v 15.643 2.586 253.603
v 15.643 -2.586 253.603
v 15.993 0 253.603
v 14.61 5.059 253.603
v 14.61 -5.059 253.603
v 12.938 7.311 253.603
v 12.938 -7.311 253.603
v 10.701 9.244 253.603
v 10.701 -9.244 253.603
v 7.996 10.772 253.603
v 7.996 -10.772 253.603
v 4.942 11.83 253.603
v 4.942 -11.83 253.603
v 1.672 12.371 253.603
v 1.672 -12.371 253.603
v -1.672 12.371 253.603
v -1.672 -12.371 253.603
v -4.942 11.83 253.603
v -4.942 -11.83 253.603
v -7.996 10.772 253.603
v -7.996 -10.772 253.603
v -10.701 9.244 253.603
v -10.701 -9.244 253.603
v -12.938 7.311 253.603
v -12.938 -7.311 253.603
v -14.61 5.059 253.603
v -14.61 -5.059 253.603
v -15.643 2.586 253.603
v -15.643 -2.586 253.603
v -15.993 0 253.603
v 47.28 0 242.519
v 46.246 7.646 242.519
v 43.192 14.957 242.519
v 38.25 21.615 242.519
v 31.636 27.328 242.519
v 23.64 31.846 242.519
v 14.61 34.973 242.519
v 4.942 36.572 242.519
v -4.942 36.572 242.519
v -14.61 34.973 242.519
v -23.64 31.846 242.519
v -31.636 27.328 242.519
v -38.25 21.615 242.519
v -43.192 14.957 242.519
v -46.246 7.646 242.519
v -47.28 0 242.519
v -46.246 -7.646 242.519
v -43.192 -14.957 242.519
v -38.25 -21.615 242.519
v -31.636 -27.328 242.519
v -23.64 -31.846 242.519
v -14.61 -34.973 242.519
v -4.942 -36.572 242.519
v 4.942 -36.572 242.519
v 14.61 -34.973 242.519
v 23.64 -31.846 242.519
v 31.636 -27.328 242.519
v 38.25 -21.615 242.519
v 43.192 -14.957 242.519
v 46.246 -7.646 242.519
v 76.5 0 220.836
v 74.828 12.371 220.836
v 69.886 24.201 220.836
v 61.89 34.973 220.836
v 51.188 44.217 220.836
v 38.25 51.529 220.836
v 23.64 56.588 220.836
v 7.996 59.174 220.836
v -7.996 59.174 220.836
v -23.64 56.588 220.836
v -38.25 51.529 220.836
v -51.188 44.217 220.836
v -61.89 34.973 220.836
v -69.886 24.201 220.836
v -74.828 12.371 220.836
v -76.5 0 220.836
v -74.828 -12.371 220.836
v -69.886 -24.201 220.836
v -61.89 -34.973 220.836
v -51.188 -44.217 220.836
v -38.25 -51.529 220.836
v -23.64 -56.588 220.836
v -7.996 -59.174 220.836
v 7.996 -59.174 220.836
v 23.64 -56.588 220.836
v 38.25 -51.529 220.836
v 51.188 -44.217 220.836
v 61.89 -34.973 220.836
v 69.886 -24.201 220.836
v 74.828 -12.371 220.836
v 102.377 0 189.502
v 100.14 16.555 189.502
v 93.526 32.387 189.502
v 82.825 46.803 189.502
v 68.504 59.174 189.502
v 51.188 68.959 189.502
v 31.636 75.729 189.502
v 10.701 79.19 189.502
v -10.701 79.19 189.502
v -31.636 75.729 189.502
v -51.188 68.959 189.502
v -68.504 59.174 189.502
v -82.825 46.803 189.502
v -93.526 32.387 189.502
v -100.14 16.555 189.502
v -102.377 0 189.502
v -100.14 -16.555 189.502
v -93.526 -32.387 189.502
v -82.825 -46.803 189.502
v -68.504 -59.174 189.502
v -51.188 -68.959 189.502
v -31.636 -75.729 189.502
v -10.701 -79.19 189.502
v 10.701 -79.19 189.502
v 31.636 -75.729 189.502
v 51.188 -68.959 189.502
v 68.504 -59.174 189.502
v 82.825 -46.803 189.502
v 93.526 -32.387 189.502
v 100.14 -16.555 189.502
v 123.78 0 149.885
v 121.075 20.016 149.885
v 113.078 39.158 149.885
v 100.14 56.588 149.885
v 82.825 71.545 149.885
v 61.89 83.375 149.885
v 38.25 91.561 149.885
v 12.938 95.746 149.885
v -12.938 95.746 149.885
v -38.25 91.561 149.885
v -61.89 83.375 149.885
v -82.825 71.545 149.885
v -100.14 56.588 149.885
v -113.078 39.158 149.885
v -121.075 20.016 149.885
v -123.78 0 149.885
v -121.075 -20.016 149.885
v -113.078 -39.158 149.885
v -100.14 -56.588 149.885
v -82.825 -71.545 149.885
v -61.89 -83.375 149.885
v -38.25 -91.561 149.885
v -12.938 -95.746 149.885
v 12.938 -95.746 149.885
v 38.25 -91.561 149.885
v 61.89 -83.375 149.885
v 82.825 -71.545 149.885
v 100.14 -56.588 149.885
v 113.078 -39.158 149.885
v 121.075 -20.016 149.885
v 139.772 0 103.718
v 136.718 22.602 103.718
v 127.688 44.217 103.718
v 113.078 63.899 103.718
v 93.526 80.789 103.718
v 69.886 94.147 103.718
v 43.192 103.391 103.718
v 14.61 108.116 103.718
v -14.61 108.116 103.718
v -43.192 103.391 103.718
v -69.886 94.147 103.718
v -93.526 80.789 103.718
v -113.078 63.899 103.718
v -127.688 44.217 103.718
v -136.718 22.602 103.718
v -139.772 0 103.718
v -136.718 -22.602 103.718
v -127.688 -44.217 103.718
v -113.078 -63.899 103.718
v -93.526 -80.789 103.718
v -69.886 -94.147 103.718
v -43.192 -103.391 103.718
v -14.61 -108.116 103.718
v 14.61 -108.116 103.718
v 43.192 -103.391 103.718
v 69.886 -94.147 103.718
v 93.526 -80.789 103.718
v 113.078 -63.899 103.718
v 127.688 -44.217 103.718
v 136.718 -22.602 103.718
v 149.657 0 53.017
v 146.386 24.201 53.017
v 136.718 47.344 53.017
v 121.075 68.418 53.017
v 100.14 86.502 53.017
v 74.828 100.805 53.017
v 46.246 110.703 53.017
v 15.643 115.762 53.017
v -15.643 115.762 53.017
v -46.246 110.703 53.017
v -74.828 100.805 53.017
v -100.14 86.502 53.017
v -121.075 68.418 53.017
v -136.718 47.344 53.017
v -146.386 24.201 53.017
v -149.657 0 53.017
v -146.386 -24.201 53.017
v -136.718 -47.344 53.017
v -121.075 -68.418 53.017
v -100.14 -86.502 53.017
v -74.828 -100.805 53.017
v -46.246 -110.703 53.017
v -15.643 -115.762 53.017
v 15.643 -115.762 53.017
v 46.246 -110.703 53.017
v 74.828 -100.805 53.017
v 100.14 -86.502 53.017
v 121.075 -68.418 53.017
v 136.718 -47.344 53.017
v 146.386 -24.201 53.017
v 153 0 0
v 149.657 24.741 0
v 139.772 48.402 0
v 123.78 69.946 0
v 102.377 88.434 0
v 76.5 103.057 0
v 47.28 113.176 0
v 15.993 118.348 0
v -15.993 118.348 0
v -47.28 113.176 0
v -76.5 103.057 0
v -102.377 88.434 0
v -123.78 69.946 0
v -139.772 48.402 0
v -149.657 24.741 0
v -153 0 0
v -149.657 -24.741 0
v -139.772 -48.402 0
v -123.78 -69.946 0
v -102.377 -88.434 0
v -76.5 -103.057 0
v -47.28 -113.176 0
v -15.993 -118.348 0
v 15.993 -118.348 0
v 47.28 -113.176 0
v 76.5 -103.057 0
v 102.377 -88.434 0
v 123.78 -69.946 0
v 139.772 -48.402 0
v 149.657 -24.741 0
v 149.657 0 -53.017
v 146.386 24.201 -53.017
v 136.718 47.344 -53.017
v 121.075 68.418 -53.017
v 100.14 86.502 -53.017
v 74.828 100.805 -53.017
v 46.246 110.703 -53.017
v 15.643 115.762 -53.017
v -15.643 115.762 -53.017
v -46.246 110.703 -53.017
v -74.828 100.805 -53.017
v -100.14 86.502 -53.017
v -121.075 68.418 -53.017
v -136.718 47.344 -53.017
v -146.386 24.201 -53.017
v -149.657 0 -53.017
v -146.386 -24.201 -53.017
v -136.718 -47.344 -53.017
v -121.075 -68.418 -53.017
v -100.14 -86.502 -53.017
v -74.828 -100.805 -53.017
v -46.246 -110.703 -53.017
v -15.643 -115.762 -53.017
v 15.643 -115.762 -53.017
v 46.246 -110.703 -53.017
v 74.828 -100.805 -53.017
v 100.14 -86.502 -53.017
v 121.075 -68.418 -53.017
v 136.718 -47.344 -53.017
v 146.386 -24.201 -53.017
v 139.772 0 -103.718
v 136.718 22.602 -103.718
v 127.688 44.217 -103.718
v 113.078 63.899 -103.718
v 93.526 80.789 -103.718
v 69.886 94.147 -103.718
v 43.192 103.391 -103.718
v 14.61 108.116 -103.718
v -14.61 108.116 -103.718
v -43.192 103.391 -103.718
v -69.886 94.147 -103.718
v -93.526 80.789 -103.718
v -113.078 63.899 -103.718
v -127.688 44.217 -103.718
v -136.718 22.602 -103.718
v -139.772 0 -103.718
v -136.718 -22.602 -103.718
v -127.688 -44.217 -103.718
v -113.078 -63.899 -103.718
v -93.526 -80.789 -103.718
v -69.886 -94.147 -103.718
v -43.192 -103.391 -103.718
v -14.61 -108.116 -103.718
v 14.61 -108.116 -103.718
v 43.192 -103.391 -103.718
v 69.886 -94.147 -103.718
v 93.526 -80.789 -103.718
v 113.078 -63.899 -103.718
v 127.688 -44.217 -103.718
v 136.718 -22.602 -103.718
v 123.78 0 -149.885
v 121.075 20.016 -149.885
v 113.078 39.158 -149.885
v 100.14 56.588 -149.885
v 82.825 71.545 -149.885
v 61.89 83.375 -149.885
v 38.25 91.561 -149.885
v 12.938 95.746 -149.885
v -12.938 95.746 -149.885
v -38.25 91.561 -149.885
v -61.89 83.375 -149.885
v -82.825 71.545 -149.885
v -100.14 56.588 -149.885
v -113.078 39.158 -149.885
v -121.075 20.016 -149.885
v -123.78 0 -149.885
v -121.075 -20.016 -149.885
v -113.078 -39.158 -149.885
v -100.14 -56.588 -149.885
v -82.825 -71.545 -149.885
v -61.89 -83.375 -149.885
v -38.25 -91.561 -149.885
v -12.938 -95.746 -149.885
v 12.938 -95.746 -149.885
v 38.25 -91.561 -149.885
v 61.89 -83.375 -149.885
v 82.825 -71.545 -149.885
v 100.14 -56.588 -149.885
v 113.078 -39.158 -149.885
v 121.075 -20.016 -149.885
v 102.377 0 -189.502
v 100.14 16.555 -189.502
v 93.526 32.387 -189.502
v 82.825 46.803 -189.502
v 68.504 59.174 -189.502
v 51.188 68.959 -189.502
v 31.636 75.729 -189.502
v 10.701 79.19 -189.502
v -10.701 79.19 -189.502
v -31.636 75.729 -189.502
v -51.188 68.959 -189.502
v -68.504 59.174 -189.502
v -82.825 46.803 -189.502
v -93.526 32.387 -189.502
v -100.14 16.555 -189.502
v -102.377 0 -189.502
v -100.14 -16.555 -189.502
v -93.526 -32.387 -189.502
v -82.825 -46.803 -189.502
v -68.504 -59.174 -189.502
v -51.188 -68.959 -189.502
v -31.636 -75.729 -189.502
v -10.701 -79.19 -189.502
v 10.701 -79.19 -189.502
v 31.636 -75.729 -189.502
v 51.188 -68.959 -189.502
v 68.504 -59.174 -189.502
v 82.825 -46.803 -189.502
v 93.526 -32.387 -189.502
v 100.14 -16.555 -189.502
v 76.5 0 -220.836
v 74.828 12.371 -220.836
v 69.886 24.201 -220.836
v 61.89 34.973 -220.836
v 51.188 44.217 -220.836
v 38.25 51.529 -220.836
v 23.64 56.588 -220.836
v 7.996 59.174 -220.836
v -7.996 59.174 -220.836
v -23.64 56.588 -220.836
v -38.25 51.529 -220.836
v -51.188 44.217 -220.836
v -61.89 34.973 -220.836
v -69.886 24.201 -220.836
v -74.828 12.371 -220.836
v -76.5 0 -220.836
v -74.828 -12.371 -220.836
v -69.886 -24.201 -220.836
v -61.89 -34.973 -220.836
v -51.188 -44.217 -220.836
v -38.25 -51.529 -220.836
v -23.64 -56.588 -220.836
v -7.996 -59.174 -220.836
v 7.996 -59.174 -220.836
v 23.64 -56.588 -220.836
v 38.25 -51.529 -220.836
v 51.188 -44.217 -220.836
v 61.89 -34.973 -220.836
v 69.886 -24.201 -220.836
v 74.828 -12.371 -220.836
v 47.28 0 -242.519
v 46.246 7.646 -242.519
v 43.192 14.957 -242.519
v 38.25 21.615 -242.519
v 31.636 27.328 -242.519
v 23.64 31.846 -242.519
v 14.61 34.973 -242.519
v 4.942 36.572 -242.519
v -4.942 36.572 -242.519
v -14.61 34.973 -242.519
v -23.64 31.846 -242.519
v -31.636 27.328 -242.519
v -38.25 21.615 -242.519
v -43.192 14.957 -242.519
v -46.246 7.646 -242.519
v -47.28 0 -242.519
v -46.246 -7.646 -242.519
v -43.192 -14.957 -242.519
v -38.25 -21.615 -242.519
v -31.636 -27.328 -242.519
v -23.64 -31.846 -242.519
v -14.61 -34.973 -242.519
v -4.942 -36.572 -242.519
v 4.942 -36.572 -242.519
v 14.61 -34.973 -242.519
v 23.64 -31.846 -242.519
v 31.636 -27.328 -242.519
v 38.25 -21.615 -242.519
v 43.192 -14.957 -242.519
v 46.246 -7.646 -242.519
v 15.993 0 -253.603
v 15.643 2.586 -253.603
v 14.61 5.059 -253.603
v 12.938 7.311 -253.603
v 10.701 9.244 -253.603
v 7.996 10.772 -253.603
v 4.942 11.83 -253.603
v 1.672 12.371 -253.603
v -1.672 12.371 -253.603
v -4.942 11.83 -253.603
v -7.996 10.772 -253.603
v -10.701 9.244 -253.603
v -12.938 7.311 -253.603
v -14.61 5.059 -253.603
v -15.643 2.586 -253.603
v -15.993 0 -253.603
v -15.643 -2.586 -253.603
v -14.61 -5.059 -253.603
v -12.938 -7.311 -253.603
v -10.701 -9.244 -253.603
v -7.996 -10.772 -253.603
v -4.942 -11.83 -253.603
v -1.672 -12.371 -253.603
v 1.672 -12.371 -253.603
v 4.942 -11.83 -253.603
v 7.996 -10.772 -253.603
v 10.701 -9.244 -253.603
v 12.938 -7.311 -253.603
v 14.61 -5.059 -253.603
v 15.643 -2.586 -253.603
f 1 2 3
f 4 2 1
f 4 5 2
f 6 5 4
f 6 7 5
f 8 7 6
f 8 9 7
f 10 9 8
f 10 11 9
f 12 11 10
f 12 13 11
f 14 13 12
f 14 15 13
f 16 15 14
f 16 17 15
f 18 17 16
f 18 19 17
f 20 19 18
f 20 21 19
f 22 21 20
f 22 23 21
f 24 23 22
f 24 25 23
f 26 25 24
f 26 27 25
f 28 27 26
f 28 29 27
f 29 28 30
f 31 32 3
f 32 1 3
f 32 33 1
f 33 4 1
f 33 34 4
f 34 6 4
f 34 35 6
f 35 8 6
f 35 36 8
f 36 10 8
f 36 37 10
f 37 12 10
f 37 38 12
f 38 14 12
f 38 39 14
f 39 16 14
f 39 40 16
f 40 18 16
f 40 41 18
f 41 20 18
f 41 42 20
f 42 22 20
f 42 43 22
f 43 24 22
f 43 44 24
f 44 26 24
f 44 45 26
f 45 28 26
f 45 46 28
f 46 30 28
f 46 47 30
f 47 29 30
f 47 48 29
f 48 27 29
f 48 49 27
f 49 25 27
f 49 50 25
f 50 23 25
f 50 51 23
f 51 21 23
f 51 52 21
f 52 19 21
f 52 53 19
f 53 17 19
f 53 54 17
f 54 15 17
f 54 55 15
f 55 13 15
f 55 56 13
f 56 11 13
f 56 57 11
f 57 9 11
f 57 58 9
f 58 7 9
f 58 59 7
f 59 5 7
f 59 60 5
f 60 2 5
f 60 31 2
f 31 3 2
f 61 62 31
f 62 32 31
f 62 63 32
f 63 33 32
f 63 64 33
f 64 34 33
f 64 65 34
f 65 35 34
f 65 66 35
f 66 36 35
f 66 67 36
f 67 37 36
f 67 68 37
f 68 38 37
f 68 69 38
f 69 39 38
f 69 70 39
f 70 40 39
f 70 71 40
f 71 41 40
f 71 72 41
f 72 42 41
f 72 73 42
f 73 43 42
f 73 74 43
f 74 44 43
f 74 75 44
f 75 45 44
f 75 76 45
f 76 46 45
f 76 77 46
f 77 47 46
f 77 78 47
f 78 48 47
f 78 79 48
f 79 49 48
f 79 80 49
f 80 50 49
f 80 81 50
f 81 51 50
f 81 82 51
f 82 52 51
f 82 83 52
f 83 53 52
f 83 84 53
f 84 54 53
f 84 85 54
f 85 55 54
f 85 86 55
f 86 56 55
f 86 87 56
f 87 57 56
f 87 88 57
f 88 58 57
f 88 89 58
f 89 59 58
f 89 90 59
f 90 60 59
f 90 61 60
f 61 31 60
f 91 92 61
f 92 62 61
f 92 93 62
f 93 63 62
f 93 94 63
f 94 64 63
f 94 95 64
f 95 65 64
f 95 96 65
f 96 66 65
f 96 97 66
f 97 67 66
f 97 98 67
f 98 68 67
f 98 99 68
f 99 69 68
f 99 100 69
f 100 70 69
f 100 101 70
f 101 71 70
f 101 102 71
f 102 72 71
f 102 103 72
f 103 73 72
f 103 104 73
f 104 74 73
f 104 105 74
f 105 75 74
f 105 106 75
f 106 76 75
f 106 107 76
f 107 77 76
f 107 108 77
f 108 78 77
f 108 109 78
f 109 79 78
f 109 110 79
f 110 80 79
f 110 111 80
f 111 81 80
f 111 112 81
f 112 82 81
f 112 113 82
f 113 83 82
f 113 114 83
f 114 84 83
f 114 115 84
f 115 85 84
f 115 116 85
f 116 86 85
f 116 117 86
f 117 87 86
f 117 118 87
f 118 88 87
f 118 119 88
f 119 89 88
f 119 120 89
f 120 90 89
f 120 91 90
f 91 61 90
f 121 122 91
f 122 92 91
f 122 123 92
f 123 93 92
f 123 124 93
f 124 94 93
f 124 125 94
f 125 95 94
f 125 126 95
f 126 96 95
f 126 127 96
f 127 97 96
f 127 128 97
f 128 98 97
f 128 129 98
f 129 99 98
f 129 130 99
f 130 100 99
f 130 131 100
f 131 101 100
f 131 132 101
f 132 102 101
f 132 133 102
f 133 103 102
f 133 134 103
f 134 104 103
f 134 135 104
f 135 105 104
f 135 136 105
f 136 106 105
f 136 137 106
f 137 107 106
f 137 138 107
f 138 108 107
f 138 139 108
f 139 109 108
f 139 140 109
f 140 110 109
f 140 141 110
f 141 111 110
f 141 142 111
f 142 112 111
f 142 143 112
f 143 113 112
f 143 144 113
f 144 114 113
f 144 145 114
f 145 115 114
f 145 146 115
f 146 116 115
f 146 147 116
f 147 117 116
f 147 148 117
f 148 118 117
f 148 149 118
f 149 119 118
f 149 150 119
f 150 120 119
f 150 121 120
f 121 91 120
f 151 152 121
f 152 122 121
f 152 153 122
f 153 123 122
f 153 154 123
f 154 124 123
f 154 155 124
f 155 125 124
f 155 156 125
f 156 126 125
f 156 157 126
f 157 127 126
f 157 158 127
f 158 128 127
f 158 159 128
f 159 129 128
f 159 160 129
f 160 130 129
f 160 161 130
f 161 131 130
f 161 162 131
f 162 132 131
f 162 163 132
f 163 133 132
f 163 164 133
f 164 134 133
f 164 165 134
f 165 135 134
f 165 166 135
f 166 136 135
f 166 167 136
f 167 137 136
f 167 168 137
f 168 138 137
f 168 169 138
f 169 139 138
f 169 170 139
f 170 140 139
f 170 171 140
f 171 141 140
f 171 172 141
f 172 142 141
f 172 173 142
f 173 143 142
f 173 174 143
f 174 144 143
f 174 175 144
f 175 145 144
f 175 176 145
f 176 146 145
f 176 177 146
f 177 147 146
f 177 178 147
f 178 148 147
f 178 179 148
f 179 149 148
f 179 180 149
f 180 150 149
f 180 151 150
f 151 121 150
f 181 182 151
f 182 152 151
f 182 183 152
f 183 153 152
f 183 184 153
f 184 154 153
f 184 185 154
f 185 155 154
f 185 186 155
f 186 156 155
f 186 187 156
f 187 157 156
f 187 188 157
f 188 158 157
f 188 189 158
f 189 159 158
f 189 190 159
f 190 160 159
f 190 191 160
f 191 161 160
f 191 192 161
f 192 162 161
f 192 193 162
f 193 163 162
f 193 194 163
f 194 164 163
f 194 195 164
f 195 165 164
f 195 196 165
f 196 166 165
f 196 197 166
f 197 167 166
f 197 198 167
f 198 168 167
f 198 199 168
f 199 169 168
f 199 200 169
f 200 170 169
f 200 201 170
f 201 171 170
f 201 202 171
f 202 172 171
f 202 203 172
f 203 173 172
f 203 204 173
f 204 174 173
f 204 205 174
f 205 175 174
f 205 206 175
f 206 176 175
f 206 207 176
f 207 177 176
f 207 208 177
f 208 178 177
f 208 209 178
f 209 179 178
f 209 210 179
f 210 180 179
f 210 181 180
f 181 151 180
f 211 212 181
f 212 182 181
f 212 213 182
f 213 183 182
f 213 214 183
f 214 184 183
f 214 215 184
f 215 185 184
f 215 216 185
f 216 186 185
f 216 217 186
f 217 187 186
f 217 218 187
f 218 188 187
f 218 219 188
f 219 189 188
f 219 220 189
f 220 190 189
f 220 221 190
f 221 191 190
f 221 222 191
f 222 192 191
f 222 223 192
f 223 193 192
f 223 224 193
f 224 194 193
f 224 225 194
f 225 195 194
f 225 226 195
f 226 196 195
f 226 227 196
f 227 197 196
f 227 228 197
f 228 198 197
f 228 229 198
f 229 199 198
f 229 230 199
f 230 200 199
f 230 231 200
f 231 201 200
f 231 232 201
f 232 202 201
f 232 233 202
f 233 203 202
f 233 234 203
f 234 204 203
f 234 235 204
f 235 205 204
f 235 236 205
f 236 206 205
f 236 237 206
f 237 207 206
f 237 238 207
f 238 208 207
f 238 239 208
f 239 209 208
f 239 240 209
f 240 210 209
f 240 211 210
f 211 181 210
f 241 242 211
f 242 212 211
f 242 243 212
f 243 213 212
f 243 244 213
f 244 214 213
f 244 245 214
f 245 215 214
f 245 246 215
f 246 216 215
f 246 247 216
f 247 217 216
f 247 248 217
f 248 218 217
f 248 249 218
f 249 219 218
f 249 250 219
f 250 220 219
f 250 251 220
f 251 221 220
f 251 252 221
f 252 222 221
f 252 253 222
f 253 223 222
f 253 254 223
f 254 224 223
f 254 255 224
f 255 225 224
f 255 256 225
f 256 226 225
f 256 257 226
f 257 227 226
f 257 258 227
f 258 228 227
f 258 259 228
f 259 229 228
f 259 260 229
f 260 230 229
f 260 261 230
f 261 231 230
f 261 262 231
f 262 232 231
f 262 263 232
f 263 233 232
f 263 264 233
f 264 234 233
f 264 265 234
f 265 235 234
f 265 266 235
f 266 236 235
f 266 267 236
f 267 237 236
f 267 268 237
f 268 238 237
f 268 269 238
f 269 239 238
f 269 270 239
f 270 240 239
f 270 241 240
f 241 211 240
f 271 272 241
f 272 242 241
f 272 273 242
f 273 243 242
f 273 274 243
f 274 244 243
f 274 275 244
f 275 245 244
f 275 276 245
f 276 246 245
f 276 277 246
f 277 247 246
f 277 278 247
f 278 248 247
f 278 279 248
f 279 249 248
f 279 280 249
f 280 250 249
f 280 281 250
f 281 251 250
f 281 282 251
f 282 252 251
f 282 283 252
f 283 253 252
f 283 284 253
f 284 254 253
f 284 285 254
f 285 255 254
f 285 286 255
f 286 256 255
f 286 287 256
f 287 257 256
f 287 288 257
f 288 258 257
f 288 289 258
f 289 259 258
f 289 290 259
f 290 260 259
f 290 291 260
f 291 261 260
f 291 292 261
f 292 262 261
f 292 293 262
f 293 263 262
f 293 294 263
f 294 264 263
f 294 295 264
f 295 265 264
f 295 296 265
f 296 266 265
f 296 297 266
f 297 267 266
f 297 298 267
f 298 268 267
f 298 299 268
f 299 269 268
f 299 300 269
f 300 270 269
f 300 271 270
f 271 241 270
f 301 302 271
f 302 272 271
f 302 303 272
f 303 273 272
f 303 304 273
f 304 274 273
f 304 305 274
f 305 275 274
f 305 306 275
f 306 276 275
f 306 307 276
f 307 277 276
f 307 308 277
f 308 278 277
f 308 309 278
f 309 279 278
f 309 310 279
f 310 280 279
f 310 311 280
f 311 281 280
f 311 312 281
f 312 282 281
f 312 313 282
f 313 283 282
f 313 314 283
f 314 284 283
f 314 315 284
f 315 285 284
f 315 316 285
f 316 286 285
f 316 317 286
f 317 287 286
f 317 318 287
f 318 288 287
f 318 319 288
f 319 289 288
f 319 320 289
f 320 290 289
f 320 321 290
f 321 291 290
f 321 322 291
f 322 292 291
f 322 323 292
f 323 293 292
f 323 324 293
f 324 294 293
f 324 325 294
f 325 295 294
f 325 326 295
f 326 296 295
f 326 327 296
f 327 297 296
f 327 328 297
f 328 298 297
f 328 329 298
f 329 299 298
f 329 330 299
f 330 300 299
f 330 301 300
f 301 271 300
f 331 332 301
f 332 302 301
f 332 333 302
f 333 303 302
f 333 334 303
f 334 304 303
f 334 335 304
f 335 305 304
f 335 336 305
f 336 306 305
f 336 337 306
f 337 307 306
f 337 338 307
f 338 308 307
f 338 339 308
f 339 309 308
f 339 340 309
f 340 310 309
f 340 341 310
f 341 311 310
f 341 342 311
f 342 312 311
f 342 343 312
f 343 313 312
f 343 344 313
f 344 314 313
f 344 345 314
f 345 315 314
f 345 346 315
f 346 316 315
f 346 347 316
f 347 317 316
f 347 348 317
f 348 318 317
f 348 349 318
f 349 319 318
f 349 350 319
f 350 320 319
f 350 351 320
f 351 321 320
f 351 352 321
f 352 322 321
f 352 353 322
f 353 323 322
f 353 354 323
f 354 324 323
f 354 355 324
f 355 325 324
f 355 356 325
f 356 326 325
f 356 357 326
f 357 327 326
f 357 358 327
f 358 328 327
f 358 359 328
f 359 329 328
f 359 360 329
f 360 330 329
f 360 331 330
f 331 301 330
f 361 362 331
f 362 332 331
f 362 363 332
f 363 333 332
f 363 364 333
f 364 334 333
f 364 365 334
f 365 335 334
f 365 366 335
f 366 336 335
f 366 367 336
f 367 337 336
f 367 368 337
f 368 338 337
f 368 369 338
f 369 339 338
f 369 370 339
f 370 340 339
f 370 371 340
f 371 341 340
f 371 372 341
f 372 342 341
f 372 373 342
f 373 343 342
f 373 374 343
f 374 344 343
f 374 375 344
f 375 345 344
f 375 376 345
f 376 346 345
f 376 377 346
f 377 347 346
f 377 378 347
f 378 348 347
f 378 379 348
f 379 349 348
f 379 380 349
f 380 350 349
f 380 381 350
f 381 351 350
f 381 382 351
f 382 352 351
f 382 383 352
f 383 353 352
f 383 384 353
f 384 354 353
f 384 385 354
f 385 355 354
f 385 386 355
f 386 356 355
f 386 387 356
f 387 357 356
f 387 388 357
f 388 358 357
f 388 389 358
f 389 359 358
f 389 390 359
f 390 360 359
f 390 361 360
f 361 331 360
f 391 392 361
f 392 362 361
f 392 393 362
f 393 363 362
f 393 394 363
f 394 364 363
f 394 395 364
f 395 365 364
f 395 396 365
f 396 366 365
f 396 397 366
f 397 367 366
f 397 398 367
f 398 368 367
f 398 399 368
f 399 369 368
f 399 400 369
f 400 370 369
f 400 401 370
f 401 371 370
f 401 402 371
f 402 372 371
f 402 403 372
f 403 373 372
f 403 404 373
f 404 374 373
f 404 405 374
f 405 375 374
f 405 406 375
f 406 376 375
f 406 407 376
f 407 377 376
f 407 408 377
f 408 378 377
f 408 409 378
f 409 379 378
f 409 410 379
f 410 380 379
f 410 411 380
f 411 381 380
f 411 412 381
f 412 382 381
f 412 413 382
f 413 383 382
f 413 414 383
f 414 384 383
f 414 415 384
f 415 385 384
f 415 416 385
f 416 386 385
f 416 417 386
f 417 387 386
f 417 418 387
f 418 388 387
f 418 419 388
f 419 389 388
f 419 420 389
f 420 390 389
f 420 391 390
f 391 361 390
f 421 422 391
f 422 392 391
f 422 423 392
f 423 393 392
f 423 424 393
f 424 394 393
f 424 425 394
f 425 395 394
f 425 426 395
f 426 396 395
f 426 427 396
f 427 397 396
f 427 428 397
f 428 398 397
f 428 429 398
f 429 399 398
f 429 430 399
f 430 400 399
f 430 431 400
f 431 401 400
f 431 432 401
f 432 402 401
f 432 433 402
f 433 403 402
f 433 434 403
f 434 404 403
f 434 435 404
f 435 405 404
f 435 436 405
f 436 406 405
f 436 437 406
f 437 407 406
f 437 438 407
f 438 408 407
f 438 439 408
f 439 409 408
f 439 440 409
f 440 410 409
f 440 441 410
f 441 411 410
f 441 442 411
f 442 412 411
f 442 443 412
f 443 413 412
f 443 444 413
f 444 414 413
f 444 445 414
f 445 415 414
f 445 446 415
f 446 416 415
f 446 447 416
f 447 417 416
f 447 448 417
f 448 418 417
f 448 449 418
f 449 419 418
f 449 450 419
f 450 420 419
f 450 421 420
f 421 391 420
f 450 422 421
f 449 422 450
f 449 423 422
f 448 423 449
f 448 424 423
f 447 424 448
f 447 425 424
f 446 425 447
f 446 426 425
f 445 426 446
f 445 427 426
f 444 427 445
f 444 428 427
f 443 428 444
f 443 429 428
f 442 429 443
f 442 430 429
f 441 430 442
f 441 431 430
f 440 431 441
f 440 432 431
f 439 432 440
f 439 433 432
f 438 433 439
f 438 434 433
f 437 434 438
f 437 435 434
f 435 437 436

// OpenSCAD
// Generated by SolidPython 1.0.1 on 2020-07-29 00:46:48


scale(v = [9, 7, 15]) {
	sphere(r = 17);
}
/***********************************************
*********      SolidPython code:      **********
************************************************
 
# import packages: SolidPython
from solid import *
from solid.utils import *
from itertools import chain, combinations, permutations


class Resize:

    def __init__(self, scad_file):
        self.scad_file = scad_file
        #self.scad_file = import_scad(scad_file)
        # cone/cylinder param:
        self.r1 = 0
        self.r2 = 0
        self.h = 0
        # rectangular prism param:
        self.w = 0
        self.l = 0
        # ellipse param:
        self.r = 0

    # import OpenScad code (file name corresponds to shape)


    # classify shape + parameters
    def assign(self, param1, param2, param3):
        if self.scad_file == 'cone.scad':
            self.r1 = param1
            self.r2 = param2
            self.h = param3
        elif self.scad_file == 'cylinder.scad':
            self.r1 = param1
            self.r2 = param2
            self.h = param3
        elif self.scad_file == 'rectangularPrism.scad':
            self.h = param1
            self.l = param2
            self.w = param3
        else:
            self.r = param1
            self.h = param2

    # resize parameters
    def iterate(self):
        x = range(3, 20, 2)
        i = 1
        if self.scad_file == 'cone.scad':
            tempList = list(permutations(x, 2))
            for temp in tempList:
                param1 = temp[0]
                param2 = temp[1]
                filepath = 'produced_scad_files/' + 'cone' + str(param1) + '_' + str(param2) + '_' + '.scad'
                scad_render_to_file(cylinder(h=param1, r1=param2, r2=0), filepath)

        elif self.scad_file == 'cylinder.scad':
            tempList = list(permutations(x, 3))
            for temp in tempList:
                param1 = temp[0]
                param2 = temp[1]
                filepath = 'produced_scad_files/' + 'cylinder' + str(param1) + '_' + str(param2) + '_' + '.scad'
                scad_render_to_file(cylinder(h=param1, r1=param2, r2=param2), filepath)

        elif self.scad_file == 'rectangularPrism.scad':
            tempList = list(permutations(x, 3))
            for temp in tempList:
                param1 = temp[0]
                param2 = temp[1]
                param3 = temp[2]
                filepath = 'produced_scad_files/' + 'rectangularPrism' + str(param1) + '_' + str(param2) + '_' + str(
                    param3) + '.scad'
                scad_render_to_file(cube(size=(param1, param2, param3)), filepath)

        elif self.scad_file == 'ellipse.scad':
            tempList = list(permutations(x, 4))
            for temp in tempList:
                param1 = temp[0]
                param2 = temp[1]
                param3 = temp[2]
                param4 = temp[3]
                filepath = 'produced_scad_files/' + 'ellipse' + str(param1) + '_' + str(param2) + '_' + str(param3) + '_' + str(param4) + '.scad'
                scad_render_to_file(scale([param1, param2, param3])(sphere(r=param4)), filepath)

    def render_to_scadfile(self):
        scad_render_to_file(scad, 'example.scad') 
 
************************************************/
